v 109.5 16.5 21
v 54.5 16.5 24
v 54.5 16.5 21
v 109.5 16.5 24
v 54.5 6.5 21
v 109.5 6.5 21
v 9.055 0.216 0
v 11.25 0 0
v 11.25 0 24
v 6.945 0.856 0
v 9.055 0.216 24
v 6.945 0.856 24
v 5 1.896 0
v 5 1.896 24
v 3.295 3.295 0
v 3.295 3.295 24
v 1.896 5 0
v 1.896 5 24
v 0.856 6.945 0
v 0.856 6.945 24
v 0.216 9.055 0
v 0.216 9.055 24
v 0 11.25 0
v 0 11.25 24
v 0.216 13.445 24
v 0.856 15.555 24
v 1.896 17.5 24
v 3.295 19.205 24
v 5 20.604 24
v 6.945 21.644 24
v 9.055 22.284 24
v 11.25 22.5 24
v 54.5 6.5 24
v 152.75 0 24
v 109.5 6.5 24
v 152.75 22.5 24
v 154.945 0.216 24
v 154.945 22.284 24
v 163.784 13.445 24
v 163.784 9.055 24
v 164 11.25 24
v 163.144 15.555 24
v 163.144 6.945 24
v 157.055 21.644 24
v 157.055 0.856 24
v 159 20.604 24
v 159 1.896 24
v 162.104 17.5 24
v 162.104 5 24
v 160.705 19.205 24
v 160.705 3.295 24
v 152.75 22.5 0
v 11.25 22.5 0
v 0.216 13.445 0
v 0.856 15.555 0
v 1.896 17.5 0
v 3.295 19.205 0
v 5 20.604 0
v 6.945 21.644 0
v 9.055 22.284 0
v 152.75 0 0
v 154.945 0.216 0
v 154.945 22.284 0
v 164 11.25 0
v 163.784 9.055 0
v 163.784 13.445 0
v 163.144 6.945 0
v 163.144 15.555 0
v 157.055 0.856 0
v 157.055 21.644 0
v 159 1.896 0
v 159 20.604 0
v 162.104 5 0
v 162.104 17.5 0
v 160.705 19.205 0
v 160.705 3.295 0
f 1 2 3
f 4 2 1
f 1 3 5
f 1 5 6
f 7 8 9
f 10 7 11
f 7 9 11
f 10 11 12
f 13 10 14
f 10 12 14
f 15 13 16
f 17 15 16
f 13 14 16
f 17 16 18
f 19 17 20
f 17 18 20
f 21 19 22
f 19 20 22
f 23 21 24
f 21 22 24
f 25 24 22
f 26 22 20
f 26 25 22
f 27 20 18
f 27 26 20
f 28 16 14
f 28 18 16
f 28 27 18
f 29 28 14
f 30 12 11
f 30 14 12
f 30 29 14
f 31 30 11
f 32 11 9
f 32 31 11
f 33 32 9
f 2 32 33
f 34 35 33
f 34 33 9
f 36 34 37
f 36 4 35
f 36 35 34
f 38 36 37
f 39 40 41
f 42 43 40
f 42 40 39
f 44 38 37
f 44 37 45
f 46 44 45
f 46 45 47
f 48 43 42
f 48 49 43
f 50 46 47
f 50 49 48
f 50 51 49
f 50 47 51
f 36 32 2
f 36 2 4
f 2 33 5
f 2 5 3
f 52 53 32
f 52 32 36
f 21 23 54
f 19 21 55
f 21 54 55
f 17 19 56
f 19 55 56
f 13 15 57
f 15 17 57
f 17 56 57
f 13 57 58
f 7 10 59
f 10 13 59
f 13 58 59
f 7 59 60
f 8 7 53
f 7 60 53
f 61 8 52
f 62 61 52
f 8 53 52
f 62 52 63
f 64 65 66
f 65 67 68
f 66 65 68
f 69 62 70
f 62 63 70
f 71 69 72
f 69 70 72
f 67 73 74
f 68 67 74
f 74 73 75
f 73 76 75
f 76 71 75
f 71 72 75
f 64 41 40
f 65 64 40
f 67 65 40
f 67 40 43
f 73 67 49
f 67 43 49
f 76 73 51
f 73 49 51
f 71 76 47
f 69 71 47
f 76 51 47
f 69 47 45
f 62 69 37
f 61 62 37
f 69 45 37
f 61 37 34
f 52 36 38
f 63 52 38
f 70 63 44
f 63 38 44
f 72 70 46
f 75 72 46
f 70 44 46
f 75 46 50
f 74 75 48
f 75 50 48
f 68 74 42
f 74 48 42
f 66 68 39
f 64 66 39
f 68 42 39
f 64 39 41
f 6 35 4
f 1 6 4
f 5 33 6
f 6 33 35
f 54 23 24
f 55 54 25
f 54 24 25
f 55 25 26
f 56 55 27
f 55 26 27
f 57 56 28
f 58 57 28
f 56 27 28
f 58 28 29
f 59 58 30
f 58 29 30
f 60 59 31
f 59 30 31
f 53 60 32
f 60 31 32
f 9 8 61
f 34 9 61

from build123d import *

# Parameters (mm, degrees)
SKETCH_1_W          = 164
SKETCH_1_H          = 22.5
EXTRUDE_1_DEPTH     = 24
CUT_EXTRUDE_1_DEPTH = 24
SKETCH_3_W          = 55
SKETCH_3_H          = 10
CUT_EXTRUDE_2_DEPTH = 3


with BuildPart() as part:
    # 草图1 → 凸台-拉伸1 (new body)
    with BuildSketch(Plane.XY):
        with Locations((82, 11.25)):
            Rectangle(SKETCH_1_W, SKETCH_1_H)
    extrude(amount=EXTRUDE_1_DEPTH)

    # 草图2 → 切除-拉伸1 (cut)
    with BuildSketch(Plane.XY.offset(24)):
        with BuildLine():
            ThreePointArc((0, 11.25), (3.295048712, 19.204951288), (11.25, 22.5))
            Line((11.25, 22.5), (0, 22.5))
            Line((0, 22.5), (0, 11.25))
        make_face()
        with BuildLine():
            ThreePointArc((11.25, 0), (3.295048712, 3.295048712), (0, 11.25))
            Line((0, 11.25), (0, 0))
            Line((0, 0), (11.25, 0))
        make_face()
        with BuildLine():
            Line((164, 22.5), (152.75, 22.5))
            ThreePointArc((152.75, 22.5), (160.704951288, 19.204951288), (164, 11.25))
            Line((164, 11.25), (164, 22.5))
        make_face()
        with BuildLine():
            Line((164, 0), (164, 11.25))
            ThreePointArc((164, 11.25), (160.704951288, 3.295048712), (152.75, 0))
            Line((152.75, 0), (164, 0))
        make_face()
    extrude(amount=-CUT_EXTRUDE_1_DEPTH, mode=Mode.SUBTRACT)

    # 草图3 → 切除-拉伸2 (cut)
    with BuildSketch(Plane.XY.offset(24)):
        with Locations((82, 11.5)):
            Rectangle(SKETCH_3_W, SKETCH_3_H)
    extrude(amount=-CUT_EXTRUDE_2_DEPTH, mode=Mode.SUBTRACT)


solid = part.part
